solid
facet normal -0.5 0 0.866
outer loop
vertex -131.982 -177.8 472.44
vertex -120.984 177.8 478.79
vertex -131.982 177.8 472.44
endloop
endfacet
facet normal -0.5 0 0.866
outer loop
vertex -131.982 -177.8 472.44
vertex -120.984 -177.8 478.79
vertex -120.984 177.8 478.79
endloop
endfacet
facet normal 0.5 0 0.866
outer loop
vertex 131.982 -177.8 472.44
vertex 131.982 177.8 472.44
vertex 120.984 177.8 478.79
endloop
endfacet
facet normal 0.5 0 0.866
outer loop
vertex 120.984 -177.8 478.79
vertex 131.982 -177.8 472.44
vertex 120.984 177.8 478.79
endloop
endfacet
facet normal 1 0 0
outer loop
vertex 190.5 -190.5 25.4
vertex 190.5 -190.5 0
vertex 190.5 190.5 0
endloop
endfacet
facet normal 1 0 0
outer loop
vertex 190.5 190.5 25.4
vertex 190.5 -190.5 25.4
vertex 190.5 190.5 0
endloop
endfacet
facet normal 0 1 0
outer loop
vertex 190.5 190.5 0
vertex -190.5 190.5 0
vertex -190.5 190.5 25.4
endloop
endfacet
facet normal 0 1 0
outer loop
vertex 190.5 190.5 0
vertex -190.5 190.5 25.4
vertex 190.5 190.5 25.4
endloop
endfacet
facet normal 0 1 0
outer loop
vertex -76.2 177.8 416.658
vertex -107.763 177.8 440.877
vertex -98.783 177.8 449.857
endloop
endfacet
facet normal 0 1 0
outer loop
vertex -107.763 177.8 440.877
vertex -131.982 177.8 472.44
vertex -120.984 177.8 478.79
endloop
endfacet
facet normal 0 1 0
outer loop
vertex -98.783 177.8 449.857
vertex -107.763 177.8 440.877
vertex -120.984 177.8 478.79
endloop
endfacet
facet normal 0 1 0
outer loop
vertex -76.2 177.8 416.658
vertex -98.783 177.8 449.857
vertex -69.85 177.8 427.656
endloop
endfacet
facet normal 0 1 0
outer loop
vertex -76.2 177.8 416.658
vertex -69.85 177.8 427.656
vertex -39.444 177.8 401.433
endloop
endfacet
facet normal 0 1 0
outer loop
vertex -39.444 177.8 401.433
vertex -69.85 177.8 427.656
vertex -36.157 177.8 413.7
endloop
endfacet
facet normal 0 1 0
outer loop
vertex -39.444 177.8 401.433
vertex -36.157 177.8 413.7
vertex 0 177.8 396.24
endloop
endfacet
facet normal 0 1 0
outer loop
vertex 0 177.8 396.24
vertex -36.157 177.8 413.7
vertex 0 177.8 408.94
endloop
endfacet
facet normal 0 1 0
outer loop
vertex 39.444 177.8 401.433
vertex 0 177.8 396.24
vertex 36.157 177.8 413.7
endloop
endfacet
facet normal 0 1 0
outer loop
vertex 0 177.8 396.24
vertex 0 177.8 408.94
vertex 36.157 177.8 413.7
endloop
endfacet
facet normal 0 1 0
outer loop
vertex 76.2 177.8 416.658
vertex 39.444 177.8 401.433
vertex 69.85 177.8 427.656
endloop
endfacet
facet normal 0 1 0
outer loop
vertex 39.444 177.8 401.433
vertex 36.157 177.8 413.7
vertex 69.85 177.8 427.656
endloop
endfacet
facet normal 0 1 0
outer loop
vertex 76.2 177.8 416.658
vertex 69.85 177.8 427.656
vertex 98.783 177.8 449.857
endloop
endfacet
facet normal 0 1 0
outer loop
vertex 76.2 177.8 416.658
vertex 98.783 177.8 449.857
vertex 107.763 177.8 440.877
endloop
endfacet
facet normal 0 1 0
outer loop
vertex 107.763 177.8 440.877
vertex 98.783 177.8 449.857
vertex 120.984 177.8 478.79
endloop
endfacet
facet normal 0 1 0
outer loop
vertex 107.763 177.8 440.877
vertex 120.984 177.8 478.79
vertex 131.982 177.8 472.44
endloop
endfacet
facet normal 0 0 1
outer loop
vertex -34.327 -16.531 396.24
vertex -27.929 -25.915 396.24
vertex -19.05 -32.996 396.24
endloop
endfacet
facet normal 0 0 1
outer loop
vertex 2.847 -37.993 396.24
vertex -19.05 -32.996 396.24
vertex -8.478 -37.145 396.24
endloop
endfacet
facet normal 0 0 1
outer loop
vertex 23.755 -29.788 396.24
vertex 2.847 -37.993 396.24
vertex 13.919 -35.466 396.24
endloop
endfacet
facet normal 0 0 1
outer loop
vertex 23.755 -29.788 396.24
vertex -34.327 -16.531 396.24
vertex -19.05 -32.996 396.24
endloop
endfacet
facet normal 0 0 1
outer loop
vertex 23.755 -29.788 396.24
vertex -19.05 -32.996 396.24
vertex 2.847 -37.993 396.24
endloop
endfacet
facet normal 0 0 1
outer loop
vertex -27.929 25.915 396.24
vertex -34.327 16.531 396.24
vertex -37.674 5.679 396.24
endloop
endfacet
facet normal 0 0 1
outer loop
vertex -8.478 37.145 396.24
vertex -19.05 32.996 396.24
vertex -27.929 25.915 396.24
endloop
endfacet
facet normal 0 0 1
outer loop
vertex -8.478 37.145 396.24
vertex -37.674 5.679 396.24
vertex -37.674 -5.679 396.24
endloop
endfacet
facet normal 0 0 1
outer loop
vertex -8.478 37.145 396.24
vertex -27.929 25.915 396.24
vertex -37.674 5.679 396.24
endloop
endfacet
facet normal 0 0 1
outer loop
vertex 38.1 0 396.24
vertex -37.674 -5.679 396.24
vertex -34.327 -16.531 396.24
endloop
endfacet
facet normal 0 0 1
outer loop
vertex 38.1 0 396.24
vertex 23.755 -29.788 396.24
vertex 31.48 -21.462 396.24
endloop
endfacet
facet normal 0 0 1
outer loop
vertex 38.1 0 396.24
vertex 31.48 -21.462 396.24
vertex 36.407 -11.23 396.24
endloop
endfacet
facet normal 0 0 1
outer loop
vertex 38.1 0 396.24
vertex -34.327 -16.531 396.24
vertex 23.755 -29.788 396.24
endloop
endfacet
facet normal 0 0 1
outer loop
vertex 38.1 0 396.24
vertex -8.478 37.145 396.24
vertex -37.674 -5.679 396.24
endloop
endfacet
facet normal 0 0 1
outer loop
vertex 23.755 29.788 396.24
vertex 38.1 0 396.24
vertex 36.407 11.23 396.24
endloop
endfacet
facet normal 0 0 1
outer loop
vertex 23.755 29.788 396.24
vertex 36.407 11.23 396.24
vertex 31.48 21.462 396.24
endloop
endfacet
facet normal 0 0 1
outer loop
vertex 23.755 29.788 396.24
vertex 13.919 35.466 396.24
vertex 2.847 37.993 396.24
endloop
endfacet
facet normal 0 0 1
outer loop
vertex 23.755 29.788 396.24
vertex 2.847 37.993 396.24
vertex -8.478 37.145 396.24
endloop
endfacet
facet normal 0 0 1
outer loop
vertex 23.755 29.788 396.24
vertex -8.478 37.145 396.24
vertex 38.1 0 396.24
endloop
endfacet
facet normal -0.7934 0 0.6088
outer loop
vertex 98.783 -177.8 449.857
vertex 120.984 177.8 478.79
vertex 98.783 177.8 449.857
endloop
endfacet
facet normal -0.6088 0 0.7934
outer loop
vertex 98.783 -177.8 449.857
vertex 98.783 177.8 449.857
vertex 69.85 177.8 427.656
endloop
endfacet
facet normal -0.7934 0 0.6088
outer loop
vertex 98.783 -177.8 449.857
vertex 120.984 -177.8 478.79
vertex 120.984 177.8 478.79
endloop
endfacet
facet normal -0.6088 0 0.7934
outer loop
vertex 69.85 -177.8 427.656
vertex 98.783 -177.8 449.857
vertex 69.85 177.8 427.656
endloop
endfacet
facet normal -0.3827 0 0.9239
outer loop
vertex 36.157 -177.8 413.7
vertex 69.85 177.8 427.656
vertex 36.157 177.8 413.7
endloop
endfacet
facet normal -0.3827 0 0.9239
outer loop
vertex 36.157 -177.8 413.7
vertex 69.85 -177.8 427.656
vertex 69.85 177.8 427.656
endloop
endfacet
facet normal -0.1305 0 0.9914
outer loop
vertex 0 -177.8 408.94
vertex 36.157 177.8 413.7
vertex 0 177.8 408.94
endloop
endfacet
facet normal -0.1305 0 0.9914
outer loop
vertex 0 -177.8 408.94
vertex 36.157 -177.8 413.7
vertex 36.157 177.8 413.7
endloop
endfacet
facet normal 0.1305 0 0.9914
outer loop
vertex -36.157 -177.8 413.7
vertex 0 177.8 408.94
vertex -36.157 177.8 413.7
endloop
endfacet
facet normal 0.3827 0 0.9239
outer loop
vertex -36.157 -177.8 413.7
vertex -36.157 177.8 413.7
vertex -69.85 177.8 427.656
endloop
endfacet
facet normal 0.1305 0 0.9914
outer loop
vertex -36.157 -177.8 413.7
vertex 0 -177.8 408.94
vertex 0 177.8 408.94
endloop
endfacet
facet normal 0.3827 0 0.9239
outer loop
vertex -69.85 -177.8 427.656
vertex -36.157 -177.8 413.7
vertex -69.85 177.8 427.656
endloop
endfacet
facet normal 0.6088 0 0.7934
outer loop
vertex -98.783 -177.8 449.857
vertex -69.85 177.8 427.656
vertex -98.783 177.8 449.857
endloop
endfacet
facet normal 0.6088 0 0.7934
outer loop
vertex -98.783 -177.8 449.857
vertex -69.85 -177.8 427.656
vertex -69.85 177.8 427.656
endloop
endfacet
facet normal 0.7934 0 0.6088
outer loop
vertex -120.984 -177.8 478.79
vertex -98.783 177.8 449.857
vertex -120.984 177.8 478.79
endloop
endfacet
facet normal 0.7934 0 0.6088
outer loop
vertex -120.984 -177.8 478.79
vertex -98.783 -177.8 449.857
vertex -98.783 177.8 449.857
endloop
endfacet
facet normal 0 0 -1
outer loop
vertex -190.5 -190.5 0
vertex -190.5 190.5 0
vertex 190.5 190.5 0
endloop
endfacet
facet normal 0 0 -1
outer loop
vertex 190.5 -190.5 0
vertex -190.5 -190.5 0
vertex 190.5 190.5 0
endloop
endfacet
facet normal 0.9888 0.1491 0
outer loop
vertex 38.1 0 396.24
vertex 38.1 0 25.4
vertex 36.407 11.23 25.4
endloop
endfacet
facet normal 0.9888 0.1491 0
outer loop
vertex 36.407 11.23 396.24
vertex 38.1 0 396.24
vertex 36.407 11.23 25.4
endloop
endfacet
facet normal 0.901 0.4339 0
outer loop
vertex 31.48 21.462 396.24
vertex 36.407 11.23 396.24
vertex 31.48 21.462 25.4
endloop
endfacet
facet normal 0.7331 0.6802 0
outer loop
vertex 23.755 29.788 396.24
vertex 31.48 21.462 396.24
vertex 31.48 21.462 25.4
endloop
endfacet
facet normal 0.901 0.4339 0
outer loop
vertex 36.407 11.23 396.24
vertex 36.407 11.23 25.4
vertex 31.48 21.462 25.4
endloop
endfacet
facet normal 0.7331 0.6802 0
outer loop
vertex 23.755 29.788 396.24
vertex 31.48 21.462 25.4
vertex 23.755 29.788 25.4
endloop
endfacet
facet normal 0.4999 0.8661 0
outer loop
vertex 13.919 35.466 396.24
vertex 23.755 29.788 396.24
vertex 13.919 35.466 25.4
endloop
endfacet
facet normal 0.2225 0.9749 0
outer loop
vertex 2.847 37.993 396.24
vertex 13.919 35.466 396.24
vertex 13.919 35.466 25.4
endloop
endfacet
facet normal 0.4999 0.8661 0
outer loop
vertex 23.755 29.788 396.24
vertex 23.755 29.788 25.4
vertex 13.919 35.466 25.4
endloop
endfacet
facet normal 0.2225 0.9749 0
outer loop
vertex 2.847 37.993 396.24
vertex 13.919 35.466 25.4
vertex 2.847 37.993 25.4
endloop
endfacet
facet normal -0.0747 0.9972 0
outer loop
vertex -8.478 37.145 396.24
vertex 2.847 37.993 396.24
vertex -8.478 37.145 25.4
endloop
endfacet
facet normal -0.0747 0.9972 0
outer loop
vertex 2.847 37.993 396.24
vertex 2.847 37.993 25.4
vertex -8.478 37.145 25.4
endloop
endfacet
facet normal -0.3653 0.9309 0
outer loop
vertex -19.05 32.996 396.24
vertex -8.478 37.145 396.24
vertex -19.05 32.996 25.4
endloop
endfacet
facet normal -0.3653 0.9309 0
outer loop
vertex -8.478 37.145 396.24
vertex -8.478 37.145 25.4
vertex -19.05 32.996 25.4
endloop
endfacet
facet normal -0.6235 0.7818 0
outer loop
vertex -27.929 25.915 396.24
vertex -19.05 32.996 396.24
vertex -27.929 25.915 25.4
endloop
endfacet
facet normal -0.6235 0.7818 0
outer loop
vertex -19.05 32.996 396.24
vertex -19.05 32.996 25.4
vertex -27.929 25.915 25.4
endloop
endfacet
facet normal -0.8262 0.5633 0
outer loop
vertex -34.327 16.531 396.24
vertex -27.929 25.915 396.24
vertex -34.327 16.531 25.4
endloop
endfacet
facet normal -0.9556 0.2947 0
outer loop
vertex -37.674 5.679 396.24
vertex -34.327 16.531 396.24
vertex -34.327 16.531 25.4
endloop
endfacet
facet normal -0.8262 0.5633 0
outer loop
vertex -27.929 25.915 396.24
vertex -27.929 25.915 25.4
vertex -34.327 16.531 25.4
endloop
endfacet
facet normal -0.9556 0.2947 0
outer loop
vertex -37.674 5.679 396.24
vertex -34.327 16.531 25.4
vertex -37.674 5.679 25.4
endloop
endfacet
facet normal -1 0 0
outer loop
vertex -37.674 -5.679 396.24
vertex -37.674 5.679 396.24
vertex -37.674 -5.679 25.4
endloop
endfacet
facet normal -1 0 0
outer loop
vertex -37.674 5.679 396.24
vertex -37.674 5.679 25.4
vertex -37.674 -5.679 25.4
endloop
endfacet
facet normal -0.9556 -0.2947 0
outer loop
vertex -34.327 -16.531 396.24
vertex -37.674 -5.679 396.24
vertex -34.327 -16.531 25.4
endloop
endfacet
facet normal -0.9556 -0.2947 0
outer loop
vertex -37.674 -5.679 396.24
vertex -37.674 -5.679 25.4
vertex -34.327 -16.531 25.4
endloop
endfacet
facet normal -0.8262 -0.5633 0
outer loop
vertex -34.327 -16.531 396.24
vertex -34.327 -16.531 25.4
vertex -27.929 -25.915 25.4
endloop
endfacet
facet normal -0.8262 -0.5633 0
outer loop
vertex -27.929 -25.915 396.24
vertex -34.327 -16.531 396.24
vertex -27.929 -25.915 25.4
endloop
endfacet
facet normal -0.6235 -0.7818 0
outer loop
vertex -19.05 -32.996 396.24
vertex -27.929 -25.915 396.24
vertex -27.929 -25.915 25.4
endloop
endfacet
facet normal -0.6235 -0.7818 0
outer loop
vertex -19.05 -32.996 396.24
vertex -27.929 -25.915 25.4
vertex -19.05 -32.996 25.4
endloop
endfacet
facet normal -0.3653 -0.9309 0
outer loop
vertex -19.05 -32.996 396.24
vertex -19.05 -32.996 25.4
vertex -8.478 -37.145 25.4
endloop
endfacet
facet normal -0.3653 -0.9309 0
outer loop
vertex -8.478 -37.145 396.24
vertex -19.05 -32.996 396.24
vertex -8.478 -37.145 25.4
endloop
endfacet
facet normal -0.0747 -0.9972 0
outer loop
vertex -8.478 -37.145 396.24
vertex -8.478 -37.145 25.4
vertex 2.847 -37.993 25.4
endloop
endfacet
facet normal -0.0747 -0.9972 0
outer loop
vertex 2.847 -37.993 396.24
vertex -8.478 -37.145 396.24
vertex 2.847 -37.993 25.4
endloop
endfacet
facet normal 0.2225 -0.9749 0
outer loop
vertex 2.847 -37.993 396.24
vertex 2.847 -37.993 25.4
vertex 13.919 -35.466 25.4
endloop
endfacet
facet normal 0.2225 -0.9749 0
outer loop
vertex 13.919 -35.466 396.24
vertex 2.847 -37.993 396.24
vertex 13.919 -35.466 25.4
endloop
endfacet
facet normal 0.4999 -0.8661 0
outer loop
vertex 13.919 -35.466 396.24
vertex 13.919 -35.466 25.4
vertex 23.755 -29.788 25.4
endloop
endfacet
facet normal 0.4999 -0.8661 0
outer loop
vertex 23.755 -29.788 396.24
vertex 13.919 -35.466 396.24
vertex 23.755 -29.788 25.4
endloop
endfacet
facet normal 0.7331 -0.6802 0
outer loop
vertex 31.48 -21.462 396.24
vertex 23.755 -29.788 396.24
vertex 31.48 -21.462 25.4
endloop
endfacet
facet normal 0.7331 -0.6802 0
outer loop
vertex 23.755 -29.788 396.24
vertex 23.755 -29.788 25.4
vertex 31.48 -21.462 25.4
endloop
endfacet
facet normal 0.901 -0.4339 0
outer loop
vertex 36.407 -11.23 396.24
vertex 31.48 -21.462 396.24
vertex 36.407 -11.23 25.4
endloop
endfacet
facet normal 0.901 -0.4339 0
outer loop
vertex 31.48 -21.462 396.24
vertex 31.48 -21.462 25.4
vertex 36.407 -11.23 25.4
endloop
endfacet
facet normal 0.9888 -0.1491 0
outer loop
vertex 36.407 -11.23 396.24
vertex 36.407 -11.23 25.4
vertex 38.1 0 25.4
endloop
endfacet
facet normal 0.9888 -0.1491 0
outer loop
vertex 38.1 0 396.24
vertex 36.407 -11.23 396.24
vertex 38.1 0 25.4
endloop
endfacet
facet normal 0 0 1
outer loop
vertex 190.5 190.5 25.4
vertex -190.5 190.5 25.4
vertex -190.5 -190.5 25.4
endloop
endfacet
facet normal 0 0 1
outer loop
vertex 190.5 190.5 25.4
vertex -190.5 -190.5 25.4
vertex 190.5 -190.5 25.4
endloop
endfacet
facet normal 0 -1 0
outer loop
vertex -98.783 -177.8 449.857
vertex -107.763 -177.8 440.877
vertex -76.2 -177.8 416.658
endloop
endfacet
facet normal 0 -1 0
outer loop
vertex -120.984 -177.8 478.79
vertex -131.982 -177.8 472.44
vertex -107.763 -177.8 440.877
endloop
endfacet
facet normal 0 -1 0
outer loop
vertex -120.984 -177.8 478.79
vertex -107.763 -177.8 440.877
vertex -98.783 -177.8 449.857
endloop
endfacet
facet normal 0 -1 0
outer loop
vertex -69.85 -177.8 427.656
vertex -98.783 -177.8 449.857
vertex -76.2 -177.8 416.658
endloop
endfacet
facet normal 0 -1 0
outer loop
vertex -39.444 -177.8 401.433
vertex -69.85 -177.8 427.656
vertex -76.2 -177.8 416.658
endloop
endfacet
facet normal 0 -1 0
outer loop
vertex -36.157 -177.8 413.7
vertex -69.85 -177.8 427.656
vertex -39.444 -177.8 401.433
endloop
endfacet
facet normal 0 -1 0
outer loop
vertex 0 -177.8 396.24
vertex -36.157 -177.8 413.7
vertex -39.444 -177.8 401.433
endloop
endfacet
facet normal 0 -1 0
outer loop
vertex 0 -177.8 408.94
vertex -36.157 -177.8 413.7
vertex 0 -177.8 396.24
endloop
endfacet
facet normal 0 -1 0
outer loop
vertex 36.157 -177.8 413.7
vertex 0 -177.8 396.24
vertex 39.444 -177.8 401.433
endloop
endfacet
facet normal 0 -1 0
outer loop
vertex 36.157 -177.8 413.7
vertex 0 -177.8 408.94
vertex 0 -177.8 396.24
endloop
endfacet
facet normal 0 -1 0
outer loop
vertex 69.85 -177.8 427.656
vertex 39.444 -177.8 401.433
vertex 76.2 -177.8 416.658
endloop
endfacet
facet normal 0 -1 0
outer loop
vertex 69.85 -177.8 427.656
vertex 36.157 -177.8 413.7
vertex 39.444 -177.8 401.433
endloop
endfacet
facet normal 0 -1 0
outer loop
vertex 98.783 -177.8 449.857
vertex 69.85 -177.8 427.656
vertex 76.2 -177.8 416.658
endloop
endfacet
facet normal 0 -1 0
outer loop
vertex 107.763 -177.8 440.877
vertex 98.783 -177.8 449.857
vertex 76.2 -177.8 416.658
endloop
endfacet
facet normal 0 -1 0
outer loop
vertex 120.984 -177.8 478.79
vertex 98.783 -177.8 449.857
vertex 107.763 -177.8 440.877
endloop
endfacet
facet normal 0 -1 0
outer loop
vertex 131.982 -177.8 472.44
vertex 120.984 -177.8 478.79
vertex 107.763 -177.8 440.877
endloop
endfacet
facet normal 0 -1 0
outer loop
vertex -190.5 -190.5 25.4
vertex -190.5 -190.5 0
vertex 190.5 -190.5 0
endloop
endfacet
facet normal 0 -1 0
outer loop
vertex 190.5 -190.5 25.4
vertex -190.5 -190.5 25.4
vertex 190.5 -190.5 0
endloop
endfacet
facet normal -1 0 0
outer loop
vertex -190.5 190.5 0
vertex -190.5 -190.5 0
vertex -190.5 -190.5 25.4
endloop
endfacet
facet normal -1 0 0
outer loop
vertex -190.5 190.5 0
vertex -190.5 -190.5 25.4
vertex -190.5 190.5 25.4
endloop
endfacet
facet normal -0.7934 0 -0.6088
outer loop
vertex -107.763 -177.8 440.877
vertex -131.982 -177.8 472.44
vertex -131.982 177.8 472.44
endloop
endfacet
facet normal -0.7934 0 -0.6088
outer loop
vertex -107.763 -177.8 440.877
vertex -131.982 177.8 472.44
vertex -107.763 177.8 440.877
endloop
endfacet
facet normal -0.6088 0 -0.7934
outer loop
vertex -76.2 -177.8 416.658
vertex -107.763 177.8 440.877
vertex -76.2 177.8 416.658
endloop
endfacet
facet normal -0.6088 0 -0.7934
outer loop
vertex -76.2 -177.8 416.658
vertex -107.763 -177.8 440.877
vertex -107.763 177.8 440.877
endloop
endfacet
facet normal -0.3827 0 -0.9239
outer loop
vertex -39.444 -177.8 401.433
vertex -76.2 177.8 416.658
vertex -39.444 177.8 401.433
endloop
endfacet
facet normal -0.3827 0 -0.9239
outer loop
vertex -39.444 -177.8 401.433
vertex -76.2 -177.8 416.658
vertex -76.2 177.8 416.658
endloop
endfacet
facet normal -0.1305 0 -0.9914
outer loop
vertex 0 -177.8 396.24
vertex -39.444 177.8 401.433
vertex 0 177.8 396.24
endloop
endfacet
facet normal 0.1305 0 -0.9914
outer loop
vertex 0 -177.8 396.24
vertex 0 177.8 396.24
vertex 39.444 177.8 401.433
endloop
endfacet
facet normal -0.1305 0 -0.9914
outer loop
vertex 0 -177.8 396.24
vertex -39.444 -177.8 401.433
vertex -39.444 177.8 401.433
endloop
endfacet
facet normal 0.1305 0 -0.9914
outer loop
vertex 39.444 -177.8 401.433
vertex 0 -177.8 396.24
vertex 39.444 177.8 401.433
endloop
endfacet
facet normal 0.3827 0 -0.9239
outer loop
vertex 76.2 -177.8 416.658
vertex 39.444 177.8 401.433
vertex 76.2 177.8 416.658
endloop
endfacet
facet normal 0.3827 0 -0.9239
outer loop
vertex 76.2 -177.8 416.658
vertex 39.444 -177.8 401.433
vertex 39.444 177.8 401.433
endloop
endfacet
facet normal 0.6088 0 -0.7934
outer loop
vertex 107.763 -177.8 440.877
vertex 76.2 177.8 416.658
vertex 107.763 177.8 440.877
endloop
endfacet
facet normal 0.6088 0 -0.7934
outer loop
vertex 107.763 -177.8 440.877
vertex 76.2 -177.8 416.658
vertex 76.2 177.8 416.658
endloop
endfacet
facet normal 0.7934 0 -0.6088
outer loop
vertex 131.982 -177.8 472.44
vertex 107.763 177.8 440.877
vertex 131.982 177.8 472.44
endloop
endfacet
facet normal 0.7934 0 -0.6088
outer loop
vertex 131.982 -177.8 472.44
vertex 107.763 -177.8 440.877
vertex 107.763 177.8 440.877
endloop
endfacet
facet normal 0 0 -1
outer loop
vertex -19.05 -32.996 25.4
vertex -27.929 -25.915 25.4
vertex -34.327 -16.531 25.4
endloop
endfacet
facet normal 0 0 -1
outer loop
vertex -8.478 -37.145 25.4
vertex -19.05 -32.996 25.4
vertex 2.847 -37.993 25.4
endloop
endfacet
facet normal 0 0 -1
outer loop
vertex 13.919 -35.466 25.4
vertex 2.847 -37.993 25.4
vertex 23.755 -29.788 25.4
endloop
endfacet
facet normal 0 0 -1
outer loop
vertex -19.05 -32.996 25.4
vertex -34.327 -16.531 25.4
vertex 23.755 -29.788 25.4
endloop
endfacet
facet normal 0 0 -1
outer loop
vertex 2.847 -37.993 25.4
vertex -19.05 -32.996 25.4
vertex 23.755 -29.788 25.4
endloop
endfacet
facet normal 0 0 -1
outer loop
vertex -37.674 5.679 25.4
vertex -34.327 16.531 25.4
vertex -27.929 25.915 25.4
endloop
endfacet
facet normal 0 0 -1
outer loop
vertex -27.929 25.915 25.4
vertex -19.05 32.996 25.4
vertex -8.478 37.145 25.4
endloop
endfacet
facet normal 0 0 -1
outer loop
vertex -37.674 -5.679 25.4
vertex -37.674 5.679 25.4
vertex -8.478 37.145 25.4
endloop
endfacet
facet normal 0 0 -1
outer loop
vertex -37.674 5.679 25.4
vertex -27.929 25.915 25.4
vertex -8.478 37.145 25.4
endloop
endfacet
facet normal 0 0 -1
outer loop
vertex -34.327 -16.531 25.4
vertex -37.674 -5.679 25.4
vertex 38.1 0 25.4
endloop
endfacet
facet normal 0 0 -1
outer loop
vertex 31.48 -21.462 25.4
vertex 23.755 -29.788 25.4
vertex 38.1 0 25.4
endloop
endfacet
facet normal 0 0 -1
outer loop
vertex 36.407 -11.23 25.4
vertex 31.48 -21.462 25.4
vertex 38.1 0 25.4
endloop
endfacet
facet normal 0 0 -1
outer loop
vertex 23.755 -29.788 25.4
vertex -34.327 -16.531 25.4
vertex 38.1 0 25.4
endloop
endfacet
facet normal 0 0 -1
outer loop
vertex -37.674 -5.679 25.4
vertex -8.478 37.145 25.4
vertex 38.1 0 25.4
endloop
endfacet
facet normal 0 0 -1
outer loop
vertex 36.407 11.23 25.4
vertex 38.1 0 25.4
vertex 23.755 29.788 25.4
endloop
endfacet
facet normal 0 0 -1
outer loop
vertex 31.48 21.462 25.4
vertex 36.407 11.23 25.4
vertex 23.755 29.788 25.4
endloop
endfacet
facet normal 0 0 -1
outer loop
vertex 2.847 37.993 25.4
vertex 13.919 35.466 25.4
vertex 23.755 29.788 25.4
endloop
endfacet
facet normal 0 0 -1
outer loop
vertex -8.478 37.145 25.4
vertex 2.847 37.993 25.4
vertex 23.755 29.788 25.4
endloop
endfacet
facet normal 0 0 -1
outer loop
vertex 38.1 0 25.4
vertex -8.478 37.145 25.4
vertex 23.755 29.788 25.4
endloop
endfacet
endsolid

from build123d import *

# Parameters (mm, degrees)
F0_W     = 381
F0_H     = 381
F1_DEPTH = 25.4
F2_R     = 38.1
F3_DEPTH = 370.84
F5_DEPTH = 177.8


with BuildPart() as f1:
    # F0 (on Top) → F1 (new body)
    with BuildSketch(Plane.XY):
        Rectangle(F0_W, F0_H)
    extrude(amount=F1_DEPTH)


with BuildPart() as f3:
    # F2 (on face) → F3 (new body)
    with BuildSketch(Plane.XY.offset(25.4)):
        Circle(F2_R)
    extrude(amount=F3_DEPTH)


with BuildPart() as f5:
    # F4 (on Front) → F5 (new body, symmetric)
    with BuildSketch(Plane.XZ):
        with BuildLine():
            Line((-120.983749, 478.79), (-131.982272, 472.44))
            ThreePointArc((-131.982272, 472.44), (0, 396.24), (131.982272, 472.44))
            Line((131.982272, 472.44), (120.983749, 478.79))
            ThreePointArc((120.983749, 478.79), (0, 408.94), (-120.983749, 478.79))
        make_face()
    extrude(amount=F5_DEPTH, both=True)


solid = Compound([f1.part, f3.part, f5.part])
